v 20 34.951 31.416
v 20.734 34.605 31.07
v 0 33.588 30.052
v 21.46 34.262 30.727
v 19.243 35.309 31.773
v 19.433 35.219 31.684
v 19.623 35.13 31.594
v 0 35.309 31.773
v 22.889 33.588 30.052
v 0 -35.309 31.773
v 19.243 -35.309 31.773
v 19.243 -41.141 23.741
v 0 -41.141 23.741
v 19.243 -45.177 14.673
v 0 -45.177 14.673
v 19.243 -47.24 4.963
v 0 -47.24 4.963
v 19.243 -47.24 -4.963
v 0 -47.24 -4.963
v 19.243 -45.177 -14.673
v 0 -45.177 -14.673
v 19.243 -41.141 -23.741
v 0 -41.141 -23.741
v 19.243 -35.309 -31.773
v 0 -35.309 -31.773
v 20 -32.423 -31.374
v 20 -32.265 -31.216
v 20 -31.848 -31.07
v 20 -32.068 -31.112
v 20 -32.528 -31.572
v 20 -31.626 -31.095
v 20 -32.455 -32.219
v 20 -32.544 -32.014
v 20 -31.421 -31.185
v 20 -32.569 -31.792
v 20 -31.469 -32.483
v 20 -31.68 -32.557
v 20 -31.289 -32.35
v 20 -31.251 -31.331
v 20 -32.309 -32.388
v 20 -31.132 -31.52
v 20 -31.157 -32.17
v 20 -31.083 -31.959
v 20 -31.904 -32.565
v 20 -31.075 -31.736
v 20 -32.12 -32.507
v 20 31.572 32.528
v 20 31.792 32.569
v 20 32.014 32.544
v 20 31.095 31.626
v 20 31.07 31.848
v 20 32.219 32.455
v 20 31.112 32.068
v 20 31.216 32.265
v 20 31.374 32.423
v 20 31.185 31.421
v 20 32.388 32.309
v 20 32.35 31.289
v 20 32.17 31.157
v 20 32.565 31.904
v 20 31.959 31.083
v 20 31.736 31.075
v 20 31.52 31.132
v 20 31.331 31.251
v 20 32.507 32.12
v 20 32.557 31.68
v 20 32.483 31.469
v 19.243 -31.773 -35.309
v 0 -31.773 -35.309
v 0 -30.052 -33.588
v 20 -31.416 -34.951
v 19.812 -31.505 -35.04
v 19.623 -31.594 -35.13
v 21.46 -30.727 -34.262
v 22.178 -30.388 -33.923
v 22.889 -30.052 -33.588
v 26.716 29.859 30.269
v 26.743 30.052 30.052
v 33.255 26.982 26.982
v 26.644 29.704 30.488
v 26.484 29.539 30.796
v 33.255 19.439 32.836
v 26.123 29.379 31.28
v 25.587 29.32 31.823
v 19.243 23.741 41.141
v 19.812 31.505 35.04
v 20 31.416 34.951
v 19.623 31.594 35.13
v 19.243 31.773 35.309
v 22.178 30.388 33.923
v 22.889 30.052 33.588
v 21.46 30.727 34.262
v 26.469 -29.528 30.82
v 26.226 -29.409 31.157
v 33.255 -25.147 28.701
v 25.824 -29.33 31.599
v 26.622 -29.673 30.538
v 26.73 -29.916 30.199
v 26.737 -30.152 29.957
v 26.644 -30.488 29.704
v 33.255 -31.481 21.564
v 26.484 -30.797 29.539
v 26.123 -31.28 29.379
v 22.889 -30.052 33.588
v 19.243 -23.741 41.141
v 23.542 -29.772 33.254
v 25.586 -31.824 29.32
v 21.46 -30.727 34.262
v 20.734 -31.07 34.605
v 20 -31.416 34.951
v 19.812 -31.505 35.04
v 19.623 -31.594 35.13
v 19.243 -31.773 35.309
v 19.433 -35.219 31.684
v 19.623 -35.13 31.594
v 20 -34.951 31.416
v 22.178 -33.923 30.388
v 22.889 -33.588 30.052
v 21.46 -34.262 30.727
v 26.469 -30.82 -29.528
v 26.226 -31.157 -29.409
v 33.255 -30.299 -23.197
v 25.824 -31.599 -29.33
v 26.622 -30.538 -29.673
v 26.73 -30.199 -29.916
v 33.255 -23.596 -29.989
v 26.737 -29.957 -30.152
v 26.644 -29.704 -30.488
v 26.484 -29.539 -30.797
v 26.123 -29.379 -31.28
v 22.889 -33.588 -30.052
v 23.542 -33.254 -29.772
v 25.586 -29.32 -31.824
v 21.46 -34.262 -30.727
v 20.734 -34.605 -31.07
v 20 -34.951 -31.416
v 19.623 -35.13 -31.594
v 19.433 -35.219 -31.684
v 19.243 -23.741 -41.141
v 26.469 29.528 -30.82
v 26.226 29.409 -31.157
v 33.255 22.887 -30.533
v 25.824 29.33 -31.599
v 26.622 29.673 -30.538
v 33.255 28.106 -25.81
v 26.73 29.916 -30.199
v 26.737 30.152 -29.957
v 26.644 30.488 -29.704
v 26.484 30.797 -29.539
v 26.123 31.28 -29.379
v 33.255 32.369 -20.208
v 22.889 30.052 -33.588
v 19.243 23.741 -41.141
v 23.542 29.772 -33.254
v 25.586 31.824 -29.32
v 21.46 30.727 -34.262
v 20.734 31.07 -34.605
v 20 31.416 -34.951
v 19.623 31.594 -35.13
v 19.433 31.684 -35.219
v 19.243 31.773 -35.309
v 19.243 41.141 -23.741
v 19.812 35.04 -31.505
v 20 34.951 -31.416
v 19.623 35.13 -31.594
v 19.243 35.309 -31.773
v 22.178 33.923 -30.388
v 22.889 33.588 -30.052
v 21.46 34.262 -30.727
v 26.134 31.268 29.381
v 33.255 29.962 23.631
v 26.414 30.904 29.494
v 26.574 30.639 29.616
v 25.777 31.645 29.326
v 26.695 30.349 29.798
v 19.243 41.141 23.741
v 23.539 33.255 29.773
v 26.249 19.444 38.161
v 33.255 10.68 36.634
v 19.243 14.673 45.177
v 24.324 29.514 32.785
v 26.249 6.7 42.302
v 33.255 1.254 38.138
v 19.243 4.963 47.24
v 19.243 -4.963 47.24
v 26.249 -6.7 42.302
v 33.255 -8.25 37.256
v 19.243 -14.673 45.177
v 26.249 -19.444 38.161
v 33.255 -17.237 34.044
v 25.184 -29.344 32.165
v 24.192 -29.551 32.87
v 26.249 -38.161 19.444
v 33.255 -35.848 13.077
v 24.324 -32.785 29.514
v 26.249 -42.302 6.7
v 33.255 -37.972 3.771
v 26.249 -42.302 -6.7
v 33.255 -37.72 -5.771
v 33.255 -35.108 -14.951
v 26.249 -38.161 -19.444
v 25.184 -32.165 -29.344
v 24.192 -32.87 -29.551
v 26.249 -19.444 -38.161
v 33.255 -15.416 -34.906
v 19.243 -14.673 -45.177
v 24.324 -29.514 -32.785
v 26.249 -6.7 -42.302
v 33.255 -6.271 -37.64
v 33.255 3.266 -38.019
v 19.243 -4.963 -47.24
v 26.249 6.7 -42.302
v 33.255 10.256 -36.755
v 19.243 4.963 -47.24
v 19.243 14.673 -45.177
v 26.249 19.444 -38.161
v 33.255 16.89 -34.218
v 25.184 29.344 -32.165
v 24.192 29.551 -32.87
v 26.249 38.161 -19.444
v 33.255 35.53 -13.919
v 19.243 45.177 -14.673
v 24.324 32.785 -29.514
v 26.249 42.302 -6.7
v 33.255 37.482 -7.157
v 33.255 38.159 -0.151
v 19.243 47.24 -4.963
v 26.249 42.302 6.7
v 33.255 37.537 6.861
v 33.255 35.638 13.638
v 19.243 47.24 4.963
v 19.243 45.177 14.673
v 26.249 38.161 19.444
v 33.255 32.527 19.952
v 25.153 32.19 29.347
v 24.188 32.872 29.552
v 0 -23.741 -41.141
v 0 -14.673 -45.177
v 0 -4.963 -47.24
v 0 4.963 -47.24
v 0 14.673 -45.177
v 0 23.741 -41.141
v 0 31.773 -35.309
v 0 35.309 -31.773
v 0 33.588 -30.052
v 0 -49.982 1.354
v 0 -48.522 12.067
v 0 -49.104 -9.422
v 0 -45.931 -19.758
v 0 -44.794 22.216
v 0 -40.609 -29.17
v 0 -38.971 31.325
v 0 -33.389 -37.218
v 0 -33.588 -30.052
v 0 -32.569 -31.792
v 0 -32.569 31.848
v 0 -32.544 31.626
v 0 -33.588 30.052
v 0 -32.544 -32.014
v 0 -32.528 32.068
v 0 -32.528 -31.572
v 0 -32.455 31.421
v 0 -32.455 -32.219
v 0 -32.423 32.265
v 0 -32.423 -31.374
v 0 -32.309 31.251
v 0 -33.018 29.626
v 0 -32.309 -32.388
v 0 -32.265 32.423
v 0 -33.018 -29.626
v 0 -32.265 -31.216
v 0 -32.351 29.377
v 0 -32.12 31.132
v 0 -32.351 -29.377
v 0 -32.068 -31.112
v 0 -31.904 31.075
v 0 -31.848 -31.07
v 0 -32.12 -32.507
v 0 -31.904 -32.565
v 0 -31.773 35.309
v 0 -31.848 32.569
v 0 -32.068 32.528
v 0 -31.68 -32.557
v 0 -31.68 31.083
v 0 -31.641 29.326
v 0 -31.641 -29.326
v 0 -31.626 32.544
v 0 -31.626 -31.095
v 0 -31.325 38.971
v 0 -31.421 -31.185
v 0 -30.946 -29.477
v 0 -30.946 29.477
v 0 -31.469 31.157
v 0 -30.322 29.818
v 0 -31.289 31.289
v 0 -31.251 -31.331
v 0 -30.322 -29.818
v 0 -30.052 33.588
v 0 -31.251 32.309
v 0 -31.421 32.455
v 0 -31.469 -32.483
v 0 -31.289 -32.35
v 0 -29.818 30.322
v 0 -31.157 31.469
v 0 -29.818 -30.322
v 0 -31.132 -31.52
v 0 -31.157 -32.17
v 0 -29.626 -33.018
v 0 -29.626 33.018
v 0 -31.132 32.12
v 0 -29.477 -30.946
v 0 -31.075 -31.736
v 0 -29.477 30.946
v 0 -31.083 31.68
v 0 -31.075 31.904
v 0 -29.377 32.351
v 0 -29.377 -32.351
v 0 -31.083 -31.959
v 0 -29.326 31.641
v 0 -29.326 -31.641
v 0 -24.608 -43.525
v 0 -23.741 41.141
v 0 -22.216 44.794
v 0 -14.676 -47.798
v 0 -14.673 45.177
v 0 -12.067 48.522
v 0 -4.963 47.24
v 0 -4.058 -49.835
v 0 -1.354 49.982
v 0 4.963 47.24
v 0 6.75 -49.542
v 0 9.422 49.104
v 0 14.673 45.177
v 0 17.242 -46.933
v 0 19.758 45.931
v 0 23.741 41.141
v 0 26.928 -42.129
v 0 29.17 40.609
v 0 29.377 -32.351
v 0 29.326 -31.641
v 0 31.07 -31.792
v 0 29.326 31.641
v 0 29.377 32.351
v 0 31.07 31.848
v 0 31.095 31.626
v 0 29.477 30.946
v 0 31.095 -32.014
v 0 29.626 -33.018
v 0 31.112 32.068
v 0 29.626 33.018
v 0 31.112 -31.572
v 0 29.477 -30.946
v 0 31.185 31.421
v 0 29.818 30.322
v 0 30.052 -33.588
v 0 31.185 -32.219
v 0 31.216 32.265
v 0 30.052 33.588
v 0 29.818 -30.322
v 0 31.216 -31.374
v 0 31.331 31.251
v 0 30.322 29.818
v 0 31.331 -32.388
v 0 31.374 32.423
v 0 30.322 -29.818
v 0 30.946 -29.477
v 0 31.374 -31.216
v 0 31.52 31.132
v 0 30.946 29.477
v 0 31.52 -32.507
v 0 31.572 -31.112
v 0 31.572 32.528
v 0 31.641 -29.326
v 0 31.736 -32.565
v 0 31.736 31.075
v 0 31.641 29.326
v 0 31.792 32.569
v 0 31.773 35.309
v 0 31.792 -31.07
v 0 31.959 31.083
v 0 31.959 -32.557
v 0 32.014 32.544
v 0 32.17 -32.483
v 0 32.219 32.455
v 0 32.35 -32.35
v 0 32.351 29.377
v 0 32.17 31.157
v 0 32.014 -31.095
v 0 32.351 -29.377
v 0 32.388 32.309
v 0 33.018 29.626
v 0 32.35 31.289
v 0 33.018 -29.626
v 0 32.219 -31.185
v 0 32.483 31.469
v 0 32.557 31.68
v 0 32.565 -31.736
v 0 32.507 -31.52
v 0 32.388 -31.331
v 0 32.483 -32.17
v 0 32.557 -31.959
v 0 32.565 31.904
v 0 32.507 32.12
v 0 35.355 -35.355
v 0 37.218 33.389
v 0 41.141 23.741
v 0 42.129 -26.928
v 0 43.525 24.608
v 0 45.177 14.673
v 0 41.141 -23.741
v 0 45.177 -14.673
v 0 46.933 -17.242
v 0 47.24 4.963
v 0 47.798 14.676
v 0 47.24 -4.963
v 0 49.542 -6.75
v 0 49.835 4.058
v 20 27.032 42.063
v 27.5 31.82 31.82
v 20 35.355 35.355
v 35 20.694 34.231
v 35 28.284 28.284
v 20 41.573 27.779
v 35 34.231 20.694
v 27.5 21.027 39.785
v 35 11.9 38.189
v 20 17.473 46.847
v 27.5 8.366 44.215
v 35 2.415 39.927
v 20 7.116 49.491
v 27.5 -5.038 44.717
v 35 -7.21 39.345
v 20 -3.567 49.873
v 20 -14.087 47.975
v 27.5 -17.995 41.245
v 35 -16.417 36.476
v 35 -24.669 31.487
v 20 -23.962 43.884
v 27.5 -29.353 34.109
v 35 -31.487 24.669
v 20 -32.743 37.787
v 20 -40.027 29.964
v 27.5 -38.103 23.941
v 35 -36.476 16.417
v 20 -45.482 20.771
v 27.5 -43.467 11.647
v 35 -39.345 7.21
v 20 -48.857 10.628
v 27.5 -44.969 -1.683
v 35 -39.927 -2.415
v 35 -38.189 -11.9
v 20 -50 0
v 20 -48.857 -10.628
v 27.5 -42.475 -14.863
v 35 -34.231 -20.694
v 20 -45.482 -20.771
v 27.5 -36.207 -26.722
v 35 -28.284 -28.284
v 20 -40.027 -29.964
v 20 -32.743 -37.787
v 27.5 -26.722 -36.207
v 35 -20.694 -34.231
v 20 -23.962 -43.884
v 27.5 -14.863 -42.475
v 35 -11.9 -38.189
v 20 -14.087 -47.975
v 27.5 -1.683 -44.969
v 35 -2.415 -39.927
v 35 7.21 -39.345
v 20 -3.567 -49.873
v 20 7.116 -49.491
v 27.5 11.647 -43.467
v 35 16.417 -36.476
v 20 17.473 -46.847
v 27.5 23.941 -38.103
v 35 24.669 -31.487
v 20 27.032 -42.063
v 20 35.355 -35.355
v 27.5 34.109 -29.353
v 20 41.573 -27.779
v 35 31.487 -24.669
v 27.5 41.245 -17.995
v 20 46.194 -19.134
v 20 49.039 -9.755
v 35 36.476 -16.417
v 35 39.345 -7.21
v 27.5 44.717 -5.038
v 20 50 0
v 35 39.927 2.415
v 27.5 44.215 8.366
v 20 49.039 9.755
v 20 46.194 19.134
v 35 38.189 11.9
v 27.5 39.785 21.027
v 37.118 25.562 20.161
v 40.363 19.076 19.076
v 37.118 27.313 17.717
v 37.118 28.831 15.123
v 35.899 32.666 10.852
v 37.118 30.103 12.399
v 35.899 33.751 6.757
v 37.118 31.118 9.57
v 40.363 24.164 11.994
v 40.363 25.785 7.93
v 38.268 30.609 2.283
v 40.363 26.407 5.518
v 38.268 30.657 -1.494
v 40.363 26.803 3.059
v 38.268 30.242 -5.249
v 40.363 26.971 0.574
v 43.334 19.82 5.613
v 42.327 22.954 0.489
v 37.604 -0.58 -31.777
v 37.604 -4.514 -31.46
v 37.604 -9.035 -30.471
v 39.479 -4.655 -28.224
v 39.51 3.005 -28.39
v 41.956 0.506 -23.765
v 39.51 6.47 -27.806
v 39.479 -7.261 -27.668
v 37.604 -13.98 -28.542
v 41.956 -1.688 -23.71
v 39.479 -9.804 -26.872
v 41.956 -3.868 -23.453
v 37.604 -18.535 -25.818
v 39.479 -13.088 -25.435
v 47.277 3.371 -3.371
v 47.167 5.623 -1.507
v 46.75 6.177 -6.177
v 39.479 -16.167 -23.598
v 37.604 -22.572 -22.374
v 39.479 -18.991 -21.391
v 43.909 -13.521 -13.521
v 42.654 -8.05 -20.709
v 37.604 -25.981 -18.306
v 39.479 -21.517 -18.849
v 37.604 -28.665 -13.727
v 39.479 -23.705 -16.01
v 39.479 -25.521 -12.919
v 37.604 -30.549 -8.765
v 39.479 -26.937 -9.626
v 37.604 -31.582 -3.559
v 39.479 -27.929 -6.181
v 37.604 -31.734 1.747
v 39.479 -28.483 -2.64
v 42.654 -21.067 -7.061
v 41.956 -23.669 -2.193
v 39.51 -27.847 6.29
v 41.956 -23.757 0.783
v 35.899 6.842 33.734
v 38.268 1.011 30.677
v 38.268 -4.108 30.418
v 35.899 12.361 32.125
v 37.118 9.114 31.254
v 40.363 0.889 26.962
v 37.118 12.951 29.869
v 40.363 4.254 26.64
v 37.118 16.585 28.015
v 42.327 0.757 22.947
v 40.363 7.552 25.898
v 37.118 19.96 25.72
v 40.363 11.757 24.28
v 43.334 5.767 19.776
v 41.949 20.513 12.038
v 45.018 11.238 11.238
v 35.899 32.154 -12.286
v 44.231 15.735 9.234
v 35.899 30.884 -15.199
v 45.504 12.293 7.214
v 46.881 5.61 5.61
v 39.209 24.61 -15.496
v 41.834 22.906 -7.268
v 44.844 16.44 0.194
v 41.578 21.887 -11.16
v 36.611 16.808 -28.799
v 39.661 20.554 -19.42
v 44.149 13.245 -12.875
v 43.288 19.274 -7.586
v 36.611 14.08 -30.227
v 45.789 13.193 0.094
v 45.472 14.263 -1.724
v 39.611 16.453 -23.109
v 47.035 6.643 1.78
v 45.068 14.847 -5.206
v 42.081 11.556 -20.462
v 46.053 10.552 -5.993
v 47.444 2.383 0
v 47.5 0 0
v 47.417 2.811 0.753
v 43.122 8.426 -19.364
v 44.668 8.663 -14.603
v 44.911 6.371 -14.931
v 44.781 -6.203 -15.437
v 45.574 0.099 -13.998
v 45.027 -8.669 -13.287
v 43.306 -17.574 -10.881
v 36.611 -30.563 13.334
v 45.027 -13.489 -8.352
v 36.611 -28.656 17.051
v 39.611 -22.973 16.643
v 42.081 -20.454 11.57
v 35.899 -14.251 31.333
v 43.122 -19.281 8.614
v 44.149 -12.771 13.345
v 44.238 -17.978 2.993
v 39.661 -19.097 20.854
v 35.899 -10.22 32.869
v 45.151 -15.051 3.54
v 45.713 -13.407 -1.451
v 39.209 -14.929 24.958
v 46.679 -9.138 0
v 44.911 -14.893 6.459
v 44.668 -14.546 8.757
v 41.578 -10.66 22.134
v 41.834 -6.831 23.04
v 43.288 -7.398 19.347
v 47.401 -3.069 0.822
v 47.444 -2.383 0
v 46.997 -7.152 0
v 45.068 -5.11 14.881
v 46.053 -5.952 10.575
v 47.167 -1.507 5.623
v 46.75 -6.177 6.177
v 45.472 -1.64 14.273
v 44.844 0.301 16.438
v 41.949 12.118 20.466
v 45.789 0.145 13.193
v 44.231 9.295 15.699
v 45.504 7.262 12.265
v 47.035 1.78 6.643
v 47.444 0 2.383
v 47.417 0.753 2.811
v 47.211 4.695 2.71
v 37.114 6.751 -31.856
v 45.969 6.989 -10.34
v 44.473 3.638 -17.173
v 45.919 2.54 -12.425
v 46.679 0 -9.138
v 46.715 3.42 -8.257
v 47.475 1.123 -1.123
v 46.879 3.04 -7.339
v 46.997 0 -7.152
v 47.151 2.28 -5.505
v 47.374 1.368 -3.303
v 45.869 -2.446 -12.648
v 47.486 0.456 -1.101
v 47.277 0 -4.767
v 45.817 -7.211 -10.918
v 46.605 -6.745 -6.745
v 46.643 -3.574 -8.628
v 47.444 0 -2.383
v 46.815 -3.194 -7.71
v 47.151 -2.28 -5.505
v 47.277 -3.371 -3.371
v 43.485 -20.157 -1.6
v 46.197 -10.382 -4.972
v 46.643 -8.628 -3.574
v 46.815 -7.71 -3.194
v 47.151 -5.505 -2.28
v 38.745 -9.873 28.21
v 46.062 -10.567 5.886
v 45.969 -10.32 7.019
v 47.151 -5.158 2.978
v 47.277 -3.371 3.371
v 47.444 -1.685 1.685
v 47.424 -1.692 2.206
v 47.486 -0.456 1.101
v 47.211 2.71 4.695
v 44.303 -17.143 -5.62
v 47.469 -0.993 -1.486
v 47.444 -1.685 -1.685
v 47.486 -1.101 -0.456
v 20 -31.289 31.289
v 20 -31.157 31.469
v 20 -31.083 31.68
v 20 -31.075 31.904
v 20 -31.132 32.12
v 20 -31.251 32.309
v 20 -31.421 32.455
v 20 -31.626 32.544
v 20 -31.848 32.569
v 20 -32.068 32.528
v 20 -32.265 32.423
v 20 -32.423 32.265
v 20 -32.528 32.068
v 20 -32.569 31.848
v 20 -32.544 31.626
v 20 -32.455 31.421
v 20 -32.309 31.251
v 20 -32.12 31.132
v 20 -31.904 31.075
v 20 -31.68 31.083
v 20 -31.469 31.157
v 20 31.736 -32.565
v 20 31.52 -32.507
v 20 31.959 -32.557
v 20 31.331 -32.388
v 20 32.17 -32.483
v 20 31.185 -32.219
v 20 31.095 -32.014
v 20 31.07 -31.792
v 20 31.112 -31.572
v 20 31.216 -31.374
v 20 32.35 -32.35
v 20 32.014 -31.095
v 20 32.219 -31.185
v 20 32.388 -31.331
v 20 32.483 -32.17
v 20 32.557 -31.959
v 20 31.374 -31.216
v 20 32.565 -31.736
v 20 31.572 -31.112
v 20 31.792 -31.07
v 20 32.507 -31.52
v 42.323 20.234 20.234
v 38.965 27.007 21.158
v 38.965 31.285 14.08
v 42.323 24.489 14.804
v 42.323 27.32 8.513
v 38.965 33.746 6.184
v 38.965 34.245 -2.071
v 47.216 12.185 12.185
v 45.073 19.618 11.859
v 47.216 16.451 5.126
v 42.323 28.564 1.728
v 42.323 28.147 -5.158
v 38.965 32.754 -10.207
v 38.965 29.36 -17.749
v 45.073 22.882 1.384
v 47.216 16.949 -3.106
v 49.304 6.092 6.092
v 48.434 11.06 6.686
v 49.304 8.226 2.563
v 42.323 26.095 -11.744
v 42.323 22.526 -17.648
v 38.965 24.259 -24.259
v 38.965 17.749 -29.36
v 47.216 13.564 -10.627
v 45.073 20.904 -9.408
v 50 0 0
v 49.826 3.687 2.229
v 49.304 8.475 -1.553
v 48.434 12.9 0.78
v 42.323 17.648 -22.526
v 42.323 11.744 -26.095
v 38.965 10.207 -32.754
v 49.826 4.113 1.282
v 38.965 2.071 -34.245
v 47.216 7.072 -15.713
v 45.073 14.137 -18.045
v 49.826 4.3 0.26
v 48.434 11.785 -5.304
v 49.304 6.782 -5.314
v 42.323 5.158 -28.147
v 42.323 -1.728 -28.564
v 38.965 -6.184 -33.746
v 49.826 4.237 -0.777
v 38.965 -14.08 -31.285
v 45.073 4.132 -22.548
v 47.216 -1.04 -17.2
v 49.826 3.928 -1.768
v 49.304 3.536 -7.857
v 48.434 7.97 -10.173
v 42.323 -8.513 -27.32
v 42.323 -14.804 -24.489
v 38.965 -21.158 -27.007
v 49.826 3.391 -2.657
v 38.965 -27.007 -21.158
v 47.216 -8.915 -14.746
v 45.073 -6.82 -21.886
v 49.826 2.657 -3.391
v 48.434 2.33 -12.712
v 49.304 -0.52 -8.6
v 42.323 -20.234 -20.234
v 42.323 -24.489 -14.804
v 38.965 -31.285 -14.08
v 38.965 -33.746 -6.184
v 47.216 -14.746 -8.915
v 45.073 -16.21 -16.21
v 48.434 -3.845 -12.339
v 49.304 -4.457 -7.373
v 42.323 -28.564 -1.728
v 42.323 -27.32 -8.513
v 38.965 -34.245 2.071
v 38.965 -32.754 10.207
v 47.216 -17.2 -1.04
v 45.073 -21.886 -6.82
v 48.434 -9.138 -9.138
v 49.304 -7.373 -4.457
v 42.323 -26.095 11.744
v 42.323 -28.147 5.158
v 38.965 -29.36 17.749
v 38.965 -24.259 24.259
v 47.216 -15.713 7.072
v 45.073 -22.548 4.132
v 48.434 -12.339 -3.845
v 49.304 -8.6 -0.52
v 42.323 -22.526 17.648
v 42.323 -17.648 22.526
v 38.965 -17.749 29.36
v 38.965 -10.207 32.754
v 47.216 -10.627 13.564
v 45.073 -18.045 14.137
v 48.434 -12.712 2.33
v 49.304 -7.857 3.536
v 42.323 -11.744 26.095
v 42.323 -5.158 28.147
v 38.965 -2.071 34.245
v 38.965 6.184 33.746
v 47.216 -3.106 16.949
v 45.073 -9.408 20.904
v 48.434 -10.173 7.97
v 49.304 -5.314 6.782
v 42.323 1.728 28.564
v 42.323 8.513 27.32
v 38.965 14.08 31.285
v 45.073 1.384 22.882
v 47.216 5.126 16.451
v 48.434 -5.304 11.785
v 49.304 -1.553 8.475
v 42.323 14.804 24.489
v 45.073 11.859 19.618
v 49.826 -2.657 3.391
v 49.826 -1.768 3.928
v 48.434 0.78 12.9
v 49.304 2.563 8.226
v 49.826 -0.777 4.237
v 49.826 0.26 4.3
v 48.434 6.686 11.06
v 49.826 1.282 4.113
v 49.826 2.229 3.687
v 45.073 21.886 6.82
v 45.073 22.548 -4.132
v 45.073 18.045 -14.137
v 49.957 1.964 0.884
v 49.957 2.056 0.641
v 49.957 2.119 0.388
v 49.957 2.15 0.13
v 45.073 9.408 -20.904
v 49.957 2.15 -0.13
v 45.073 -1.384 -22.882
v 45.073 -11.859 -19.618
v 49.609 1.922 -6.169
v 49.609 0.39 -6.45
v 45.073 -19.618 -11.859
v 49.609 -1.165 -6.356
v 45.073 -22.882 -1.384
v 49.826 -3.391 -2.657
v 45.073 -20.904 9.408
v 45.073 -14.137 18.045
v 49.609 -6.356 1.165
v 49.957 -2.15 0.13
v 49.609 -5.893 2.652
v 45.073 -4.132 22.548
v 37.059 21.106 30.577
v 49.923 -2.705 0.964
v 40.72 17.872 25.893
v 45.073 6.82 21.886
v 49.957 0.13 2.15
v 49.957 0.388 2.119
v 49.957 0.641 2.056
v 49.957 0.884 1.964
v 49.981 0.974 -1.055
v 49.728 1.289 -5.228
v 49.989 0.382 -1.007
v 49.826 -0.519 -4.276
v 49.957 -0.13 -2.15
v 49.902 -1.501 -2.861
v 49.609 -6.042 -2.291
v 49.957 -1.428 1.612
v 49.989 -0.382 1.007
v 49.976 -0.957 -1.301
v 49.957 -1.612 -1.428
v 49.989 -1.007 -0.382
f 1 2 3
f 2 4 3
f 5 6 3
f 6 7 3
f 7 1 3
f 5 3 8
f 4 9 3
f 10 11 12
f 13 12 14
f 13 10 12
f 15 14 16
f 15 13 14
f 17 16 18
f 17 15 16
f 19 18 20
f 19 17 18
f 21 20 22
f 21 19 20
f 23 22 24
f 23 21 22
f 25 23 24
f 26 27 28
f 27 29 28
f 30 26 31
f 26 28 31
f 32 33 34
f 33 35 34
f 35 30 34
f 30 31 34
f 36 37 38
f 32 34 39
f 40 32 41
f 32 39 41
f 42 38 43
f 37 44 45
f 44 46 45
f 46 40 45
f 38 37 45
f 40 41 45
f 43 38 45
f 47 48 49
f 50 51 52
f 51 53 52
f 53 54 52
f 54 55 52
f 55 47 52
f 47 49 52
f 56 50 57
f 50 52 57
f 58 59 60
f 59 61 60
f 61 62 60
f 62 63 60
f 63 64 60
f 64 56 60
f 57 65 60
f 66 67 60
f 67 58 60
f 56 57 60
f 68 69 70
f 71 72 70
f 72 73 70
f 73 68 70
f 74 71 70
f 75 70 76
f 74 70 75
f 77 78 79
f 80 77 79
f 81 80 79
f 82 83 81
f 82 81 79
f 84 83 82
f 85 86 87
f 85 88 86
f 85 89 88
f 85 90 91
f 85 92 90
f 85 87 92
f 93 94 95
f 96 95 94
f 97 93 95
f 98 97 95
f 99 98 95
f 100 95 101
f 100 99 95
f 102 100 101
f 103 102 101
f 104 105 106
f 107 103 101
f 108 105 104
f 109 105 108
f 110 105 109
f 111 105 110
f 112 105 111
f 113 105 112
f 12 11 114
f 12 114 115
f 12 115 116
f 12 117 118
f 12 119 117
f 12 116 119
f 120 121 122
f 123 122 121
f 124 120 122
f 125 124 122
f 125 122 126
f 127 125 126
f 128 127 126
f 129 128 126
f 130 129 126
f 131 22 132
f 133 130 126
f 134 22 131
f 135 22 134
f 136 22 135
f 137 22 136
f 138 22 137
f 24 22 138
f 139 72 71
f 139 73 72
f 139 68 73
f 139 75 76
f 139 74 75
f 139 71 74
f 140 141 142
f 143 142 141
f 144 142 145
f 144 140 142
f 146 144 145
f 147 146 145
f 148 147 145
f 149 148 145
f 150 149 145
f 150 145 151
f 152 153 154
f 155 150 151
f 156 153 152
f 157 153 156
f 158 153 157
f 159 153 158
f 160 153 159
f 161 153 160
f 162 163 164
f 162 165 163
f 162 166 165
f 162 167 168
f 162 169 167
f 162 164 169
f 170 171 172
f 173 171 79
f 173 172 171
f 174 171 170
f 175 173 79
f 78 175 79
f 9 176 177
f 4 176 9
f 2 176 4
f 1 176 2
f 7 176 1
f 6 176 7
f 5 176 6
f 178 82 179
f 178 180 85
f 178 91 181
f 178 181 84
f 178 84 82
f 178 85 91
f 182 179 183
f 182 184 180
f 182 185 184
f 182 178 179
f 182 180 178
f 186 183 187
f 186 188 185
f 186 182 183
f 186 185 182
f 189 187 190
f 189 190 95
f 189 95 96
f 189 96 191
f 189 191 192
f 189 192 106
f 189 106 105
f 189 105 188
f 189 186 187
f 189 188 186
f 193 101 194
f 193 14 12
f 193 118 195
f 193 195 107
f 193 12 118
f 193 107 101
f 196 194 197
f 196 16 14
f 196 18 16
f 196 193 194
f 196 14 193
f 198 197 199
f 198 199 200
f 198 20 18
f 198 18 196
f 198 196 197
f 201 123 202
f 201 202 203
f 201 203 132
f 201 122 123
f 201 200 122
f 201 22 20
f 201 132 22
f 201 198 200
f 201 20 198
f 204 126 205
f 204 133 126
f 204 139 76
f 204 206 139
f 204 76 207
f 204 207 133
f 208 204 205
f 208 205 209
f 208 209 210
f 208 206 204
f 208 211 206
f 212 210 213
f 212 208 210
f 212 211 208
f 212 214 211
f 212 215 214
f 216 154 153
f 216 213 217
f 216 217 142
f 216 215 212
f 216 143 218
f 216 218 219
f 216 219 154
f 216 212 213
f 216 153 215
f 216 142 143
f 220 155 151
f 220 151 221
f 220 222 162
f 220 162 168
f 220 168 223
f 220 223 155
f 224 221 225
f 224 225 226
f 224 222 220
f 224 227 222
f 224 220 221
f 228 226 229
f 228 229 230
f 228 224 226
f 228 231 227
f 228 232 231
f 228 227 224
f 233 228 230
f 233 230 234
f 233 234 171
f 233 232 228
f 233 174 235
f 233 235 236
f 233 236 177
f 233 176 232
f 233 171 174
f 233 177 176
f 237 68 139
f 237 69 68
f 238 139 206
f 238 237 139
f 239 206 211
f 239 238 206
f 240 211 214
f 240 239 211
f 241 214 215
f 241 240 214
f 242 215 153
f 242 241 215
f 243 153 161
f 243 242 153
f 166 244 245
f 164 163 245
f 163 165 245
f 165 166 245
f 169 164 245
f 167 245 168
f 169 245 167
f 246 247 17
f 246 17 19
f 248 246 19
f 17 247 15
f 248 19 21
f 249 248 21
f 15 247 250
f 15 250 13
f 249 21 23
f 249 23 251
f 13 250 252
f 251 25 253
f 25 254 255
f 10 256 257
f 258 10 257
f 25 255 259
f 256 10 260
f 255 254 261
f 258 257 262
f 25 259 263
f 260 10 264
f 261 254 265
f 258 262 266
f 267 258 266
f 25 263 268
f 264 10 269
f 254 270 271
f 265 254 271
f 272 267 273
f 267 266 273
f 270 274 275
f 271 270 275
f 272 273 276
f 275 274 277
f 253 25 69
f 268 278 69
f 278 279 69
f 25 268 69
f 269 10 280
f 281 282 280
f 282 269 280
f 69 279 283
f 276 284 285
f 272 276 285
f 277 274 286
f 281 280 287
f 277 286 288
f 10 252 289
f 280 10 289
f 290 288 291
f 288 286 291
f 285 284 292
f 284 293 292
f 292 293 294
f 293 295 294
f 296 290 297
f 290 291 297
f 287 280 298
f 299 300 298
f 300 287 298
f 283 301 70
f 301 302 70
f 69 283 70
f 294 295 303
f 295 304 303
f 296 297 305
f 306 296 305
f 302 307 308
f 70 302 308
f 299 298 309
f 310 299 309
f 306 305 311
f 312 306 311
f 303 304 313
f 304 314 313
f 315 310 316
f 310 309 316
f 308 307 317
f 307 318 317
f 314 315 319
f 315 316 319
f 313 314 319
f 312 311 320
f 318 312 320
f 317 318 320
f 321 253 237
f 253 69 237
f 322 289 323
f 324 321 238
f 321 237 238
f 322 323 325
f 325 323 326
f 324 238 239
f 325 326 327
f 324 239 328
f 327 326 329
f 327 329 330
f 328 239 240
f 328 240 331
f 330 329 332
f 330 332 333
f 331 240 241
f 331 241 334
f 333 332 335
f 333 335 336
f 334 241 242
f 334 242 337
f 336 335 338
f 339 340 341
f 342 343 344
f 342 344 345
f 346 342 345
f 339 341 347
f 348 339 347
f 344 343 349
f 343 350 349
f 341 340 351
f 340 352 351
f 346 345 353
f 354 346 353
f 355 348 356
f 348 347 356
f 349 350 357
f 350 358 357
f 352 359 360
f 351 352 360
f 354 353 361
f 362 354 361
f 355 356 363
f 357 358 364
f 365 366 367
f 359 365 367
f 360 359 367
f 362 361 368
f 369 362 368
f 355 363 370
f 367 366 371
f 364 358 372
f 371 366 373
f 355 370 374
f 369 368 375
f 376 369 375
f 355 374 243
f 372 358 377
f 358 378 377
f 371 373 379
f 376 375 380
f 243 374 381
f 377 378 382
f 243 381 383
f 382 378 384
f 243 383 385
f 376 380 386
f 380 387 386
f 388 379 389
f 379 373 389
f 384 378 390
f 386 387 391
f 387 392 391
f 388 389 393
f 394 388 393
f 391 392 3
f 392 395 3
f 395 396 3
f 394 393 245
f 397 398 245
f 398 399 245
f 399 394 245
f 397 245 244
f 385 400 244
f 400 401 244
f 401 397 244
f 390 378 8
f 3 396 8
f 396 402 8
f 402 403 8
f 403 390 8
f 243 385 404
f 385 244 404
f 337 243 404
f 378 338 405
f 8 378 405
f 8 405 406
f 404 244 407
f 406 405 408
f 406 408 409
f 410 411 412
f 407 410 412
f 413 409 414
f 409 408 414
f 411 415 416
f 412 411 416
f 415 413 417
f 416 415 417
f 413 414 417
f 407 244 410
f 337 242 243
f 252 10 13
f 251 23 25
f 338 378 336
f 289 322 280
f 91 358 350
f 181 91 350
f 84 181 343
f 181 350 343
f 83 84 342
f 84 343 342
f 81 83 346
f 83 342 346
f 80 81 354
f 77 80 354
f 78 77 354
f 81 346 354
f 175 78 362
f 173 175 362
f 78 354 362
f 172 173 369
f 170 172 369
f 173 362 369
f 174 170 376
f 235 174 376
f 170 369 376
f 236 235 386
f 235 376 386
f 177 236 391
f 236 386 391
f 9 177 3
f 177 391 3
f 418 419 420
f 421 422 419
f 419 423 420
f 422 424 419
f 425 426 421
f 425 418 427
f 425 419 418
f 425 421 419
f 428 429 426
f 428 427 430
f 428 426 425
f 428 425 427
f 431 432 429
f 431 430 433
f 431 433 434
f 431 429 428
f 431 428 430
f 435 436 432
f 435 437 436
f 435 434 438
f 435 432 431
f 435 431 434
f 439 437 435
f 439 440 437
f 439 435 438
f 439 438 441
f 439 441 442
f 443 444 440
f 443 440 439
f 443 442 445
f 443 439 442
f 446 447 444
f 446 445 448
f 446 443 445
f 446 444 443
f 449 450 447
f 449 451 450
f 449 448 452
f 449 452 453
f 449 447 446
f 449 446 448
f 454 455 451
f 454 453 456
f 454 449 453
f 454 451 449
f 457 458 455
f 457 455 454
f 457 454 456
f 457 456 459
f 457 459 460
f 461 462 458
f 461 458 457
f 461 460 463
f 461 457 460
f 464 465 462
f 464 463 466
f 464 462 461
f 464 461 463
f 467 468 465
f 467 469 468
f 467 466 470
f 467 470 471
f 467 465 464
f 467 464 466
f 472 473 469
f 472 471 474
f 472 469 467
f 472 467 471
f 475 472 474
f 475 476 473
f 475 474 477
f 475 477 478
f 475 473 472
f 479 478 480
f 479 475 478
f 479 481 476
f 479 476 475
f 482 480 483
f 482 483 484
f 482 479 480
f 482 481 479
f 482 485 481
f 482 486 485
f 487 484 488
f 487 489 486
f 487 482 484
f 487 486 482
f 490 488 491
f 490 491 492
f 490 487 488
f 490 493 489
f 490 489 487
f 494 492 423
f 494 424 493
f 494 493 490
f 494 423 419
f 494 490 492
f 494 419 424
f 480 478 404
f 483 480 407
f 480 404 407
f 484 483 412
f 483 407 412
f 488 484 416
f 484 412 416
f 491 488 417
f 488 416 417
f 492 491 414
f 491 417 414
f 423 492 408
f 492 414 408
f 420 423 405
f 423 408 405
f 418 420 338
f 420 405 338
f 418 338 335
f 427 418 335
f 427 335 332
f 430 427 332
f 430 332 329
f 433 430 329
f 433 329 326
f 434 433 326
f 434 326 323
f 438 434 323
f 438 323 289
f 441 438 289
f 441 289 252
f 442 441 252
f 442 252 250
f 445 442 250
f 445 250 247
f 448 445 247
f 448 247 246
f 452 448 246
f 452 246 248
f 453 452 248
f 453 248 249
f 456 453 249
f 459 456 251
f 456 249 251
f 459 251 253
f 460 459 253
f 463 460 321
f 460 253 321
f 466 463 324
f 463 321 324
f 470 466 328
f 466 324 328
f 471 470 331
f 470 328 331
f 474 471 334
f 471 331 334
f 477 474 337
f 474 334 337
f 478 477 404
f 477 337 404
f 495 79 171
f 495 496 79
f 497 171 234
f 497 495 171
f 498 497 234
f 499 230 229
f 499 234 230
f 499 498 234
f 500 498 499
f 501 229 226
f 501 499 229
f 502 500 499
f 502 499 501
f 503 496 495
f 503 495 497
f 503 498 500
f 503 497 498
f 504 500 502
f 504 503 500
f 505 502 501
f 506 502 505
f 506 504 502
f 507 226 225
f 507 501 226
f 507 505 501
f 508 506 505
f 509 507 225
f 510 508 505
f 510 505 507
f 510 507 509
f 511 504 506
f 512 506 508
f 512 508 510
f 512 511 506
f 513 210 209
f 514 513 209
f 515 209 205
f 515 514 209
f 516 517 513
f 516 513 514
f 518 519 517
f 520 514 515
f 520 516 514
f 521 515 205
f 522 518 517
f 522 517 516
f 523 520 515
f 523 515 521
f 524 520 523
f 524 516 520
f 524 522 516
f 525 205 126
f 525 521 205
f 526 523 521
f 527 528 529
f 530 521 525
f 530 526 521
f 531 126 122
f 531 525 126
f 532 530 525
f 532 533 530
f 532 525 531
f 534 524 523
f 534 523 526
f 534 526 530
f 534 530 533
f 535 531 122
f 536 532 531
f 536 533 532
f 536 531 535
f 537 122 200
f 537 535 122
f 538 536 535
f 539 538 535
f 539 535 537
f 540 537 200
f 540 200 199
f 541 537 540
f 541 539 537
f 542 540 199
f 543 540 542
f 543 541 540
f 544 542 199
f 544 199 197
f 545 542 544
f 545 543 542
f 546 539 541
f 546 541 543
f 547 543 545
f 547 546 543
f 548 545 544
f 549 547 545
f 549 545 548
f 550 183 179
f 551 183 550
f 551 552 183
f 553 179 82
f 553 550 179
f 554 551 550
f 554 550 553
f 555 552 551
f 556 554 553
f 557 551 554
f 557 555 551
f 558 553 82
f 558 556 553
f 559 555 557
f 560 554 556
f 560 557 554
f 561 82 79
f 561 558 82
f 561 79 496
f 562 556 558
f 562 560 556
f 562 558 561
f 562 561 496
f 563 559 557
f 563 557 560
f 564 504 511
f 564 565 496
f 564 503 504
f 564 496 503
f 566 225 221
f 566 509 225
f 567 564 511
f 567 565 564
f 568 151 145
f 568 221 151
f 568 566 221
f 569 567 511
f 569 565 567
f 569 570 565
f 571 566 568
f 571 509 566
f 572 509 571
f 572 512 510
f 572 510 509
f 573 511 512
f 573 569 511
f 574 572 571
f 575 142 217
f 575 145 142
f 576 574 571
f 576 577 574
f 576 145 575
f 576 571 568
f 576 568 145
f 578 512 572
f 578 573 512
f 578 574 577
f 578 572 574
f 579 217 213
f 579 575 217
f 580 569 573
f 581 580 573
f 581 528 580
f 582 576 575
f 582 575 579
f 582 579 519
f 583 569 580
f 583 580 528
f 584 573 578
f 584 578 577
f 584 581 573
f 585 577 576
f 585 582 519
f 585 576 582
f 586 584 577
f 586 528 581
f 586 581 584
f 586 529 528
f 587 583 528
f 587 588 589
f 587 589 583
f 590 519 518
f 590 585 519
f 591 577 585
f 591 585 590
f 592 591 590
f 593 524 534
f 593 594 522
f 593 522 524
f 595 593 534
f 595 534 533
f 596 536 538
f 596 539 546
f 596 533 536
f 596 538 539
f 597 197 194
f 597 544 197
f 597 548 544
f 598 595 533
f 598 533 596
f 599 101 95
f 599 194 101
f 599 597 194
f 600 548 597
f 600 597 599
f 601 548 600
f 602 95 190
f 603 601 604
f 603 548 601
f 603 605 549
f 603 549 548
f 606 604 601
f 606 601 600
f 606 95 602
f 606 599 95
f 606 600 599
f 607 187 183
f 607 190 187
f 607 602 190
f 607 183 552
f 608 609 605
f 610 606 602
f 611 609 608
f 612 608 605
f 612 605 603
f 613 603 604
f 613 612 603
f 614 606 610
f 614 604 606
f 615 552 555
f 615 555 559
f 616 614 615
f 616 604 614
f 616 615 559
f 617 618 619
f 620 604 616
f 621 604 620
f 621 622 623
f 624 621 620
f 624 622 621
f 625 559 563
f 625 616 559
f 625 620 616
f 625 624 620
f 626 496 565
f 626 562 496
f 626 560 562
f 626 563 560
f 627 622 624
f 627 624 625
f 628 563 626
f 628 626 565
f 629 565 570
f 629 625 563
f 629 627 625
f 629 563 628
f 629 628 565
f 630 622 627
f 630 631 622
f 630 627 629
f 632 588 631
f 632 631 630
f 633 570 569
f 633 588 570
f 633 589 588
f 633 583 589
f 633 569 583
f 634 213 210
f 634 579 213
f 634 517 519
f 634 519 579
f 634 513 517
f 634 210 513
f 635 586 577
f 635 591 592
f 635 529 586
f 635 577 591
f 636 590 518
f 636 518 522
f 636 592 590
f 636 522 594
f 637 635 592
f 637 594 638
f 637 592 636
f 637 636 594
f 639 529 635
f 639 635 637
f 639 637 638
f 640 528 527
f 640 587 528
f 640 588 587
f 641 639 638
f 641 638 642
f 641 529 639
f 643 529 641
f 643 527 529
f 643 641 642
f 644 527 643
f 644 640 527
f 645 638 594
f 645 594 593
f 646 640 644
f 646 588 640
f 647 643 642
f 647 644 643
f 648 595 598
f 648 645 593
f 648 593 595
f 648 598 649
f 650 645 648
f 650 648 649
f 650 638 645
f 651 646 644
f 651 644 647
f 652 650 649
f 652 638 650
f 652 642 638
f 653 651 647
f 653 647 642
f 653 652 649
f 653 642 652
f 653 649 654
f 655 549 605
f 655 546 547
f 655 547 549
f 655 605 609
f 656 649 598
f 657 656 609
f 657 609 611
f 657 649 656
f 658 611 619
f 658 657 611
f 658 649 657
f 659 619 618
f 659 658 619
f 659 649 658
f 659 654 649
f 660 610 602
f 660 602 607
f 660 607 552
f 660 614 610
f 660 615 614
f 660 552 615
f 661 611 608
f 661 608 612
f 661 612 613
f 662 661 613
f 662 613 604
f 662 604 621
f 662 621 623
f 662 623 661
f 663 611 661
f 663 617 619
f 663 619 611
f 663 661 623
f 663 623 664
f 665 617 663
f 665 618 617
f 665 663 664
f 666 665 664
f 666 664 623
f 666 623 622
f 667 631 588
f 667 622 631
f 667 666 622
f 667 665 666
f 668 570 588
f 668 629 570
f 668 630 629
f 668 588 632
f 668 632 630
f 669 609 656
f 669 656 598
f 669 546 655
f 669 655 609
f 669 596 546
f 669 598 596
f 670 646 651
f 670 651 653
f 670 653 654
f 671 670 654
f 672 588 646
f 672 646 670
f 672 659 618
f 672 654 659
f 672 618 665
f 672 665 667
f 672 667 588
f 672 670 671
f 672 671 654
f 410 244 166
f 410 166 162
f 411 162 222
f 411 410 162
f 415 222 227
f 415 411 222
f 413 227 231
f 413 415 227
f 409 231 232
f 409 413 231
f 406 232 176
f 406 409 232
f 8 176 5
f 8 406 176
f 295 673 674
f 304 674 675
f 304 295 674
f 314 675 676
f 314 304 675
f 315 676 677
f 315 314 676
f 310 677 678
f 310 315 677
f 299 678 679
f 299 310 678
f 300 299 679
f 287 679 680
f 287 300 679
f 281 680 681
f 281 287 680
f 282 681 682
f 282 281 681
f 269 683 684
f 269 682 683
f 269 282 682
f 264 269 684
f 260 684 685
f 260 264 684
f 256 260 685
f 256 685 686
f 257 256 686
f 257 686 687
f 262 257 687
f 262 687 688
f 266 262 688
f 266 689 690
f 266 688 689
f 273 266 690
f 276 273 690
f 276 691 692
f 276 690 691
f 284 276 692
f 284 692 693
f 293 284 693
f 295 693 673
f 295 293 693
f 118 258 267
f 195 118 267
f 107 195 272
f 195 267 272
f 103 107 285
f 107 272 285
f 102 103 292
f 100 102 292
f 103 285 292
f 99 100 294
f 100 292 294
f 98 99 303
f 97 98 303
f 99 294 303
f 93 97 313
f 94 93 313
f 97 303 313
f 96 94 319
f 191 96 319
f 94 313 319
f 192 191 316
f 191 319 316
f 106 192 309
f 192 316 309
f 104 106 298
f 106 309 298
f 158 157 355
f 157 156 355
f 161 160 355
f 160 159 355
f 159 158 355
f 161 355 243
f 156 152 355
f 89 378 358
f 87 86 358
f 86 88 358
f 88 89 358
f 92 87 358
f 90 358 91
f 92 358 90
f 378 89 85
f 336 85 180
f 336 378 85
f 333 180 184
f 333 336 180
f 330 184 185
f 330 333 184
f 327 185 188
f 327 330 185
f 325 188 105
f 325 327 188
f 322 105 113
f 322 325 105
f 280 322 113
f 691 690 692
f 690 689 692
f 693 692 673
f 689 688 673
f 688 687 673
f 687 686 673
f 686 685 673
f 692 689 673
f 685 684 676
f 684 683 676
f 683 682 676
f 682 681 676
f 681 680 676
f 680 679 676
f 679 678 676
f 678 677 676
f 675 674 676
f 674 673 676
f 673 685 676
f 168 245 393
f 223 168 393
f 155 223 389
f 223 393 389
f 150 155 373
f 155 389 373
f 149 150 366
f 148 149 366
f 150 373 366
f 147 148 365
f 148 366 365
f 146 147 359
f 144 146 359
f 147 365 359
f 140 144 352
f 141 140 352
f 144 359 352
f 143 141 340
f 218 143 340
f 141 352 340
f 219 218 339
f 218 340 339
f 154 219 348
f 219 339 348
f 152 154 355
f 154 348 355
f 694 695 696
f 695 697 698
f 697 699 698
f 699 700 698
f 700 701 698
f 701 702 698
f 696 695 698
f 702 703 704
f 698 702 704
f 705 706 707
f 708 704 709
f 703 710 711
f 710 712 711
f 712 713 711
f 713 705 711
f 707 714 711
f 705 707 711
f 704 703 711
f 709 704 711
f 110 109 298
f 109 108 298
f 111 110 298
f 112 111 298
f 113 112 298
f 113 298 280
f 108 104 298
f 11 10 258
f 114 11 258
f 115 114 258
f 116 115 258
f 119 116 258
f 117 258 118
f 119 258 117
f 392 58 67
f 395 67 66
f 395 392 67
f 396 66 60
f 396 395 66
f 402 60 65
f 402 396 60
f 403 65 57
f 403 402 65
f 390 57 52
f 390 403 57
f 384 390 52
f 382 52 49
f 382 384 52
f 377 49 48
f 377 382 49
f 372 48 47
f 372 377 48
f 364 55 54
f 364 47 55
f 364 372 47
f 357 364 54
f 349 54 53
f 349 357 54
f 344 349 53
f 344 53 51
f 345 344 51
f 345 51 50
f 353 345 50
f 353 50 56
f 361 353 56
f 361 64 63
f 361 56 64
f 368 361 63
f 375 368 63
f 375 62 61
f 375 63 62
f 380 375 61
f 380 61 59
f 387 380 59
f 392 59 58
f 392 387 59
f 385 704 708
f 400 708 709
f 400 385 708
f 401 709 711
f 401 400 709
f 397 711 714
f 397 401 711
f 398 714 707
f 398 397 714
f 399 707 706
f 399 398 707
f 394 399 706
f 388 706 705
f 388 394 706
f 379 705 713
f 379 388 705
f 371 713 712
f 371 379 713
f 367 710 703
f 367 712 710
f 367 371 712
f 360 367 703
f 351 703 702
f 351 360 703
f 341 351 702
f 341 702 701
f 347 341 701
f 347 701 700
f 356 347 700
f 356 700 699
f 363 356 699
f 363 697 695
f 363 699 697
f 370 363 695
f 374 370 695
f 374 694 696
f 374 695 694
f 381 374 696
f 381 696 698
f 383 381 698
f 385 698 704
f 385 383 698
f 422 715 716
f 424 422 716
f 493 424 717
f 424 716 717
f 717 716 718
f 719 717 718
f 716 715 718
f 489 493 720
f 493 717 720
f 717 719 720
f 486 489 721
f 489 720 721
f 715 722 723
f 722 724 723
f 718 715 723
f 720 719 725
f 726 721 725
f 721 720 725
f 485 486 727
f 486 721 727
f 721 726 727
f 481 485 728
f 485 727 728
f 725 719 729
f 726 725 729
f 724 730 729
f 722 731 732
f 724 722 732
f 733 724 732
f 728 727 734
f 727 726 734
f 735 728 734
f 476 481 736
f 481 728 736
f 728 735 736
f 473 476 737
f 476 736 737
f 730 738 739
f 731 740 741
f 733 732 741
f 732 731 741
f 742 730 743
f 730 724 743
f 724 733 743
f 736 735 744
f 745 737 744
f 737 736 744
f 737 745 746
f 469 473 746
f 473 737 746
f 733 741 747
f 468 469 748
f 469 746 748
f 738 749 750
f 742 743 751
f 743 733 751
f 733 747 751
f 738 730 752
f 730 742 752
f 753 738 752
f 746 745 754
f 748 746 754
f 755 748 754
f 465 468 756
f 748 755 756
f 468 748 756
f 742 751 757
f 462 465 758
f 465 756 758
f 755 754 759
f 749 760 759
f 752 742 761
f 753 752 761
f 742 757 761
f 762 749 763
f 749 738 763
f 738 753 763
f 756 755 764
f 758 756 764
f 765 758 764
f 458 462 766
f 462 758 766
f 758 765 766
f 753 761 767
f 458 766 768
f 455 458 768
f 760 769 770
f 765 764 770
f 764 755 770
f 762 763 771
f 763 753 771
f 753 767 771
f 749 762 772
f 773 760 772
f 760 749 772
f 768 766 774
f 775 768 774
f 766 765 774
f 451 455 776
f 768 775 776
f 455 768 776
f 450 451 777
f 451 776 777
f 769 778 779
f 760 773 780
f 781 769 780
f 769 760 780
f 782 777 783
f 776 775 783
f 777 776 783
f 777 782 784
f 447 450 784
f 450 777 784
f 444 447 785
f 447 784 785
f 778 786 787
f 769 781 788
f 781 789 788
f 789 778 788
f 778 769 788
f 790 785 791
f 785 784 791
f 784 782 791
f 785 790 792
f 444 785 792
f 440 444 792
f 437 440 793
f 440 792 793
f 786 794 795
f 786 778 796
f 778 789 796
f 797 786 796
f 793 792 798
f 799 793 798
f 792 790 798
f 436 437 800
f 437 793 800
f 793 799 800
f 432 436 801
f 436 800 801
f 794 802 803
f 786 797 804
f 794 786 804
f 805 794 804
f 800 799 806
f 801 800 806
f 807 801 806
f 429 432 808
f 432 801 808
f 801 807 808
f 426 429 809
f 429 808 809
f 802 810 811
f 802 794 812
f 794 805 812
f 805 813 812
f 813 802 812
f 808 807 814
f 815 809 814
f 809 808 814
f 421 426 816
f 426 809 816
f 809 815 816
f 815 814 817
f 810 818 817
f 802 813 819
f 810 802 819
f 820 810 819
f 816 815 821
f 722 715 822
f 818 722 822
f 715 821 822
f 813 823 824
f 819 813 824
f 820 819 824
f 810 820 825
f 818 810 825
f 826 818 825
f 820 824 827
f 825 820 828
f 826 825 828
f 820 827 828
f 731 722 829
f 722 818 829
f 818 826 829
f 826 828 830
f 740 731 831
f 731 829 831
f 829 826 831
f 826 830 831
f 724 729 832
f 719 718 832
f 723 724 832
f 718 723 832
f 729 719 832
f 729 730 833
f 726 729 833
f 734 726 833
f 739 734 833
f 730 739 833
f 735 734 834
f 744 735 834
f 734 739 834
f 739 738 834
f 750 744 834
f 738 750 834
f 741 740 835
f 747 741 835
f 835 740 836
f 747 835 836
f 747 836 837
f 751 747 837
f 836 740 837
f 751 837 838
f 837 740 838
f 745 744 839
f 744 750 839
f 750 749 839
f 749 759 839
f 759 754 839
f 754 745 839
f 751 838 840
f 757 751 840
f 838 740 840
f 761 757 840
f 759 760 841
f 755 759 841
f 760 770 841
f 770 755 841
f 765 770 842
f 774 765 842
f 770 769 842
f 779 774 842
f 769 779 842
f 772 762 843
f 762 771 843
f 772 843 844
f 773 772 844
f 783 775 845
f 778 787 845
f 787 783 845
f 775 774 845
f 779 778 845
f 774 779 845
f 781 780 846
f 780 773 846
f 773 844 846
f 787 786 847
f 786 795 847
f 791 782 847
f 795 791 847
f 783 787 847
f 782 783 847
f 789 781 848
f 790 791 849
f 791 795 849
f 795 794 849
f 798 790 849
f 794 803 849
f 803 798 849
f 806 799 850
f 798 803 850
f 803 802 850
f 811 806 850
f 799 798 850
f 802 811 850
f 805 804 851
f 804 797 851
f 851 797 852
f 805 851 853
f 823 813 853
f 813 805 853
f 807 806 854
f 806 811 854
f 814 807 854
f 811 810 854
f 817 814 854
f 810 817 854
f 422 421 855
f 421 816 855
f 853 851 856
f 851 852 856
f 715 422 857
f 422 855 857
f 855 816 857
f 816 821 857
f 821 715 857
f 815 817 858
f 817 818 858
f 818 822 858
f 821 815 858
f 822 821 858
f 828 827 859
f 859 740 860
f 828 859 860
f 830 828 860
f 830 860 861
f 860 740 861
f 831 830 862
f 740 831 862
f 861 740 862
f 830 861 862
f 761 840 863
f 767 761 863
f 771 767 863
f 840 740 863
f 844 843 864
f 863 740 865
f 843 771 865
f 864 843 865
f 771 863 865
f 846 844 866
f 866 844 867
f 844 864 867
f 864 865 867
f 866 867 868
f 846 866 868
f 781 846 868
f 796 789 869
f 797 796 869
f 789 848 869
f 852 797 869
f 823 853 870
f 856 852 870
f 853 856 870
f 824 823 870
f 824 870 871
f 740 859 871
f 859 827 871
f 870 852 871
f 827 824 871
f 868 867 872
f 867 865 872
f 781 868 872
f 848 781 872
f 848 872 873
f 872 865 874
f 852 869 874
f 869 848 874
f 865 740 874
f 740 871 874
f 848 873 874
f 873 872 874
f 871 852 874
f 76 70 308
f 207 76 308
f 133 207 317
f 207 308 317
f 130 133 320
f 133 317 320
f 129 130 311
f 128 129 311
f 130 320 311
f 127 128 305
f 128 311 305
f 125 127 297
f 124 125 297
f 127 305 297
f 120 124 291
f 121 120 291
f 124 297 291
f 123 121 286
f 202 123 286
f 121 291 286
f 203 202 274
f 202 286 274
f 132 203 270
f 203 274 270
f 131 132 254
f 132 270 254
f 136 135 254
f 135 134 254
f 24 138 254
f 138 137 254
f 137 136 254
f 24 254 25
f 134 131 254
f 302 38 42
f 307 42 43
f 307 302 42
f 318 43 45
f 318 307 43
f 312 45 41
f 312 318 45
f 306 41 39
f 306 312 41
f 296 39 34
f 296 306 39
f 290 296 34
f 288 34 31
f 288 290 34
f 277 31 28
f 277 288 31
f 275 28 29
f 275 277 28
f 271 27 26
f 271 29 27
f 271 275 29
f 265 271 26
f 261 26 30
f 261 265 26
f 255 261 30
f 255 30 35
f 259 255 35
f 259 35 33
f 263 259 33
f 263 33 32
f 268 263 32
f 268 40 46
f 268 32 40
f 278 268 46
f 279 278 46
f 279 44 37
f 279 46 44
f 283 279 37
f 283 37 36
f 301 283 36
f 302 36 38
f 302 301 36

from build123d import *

# Parameters (mm, degrees)
SURFACE_EXTRUDE3_1_DEPTH = 20
THICKEN6_T1              = 2.5
BOSS_EXTRUDE2_DEPTH      = 20
SKETCH6_R                = 0.75
CUT_EXTRUDE1_DEPTH       = 74.484692283
BOSS_EXTRUDE4_REACH      = 75.485
THICKEN8_T1              = 2.5
BODY_MOVE_COPY1_ANGLE    = 45


# Read off the part's stored shape, not the designer's step: Thicken7
with BuildPart() as body_1:
    # Surface-Extrude3: a surface, the sketch's curves swept straight by 20 mm
    with BuildLine(Plane(origin=(0, 0, 0), x_dir=(0, 0, -1), z_dir=(1, 0, 0)), mode=Mode.PRIVATE) as surface_extrude3_1_path:
        CenterArc((0, 0), 50, 0, 360)
    surface_extrude3_1 = Shell.extrude(surface_extrude3_1_path.wire(), (1 * SURFACE_EXTRUDE3_1_DEPTH, 0 * SURFACE_EXTRUDE3_1_DEPTH, 0 * SURFACE_EXTRUDE3_1_DEPTH))
    add(Solid.thicken(surface_extrude3_1, THICKEN6_T1))

    # Sketch5 → Boss-Extrude2 (add)
    with BuildSketch(Plane(origin=(0, 0, 0), x_dir=(0, 0, -1), z_dir=(1, 0, 0))):
        with BuildLine():
            Line((2.5, 45), (2.5, 47.5))
            Line((2.5, 47.5), (-2.5, 47.5))
            Line((-2.5, 47.5), (-2.5, 45))
            ThreePointArc((-2.5, 45), (0, 42.5), (2.5, 45))
        make_face()
        with BuildLine():
            Line((-45, -2.5), (-47.5, -2.5))
            Line((-47.5, -2.5), (-47.5, 2.5))
            Line((-47.5, 2.5), (-45, 2.5))
            ThreePointArc((-45, 2.5), (-42.5, 0), (-45, -2.5))
        make_face()
        with BuildLine():
            Line((47.5, 2.5), (45, 2.5))
            ThreePointArc((45, 2.5), (42.5, 0), (45, -2.5))
            Line((45, -2.5), (47.5, -2.5))
            Line((47.5, -2.5), (47.5, 2.5))
        make_face()
        with BuildLine():
            Line((-2.5, -47.5), (2.5, -47.5))
            Line((2.5, -47.5), (2.5, -45))
            ThreePointArc((2.5, -45), (0, -42.5), (-2.5, -45))
            Line((-2.5, -45), (-2.5, -47.5))
        make_face()
    extrude(amount=BOSS_EXTRUDE2_DEPTH)

    # Sketch6 → Cut-Extrude1 (cut, through all)
    with BuildSketch(Plane(origin=(0, 0, 0), x_dir=(0, 0, -1), z_dir=(1, 0, 0))):
        with Locations((0, 45)):
            Circle(SKETCH6_R)
        with Locations((45, 0)):
            Circle(SKETCH6_R)
        with Locations((0, -45)):
            Circle(SKETCH6_R)
        with Locations((-45, 0)):
            Circle(SKETCH6_R)
    extrude(amount=CUT_EXTRUDE1_DEPTH, mode=Mode.SUBTRACT)

    # Thicken7 outline → Thicken7 (revolve)
    with BuildSketch(Plane.YX):
        Polygon((40, 35), (37.919874264, 33.613249509), (47.5, 19.243060906), (47.5, 20), (50, 20), align=None)
    revolve(axis=Axis((0, 0, 0), (1, 0, 0)))

    # Sketch10 → Boss-Extrude4 (add, up to next)
    with BuildSketch(Plane(origin=(20, 0, 0), x_dir=(0, 0, -1), z_dir=(1, 0, 0)), mode=Mode.PRIVATE) as boss_extrude4_sk1:
        with BuildLine():
            Line((-45, 2.5), (-46.92883092, 2.5))
            ThreePointArc((-46.92883092, 2.5), (-46.995373937, 0), (-46.92883092, -2.5))
            Line((-46.92883092, -2.5), (-45, -2.5))
            ThreePointArc((-45, -2.5), (-42.5, 0), (-45, 2.5))
        make_face()
    boss_extrude4_tool1 = extrude(boss_extrude4_sk1.sketch, amount=BOSS_EXTRUDE4_REACH, mode=Mode.PRIVATE) - body_1.part
    # Sketch10 → Boss-Extrude4 (add, up to next)
    with BuildSketch(Plane(origin=(20, 0, 0), x_dir=(0, 0, -1), z_dir=(1, 0, 0)), mode=Mode.PRIVATE) as boss_extrude4_sk2:
        with BuildLine():
            Line((-2.5, -45), (-2.5, -46.92883092))
            ThreePointArc((-2.5, -46.92883092), (0, -46.995373937), (2.5, -46.92883092))
            Line((2.5, -46.92883092), (2.5, -45))
            ThreePointArc((2.5, -45), (0, -42.5), (-2.5, -45))
        make_face()
    boss_extrude4_tool2 = extrude(boss_extrude4_sk2.sketch, amount=BOSS_EXTRUDE4_REACH, mode=Mode.PRIVATE) - body_1.part
    # Sketch10 → Boss-Extrude4 (add, up to next)
    with BuildSketch(Plane(origin=(20, 0, 0), x_dir=(0, 0, -1), z_dir=(1, 0, 0)), mode=Mode.PRIVATE) as boss_extrude4_sk3:
        with BuildLine():
            Line((45, -2.5), (46.92883092, -2.5))
            ThreePointArc((46.92883092, -2.5), (46.995373937, 0), (46.92883092, 2.5))
            Line((46.92883092, 2.5), (45, 2.5))
            ThreePointArc((45, 2.5), (42.5, 0), (45, -2.5))
        make_face()
    boss_extrude4_tool3 = extrude(boss_extrude4_sk3.sketch, amount=BOSS_EXTRUDE4_REACH, mode=Mode.PRIVATE) - body_1.part
    # Sketch10 → Boss-Extrude4 (add, up to next)
    with BuildSketch(Plane(origin=(20, 0, 0), x_dir=(0, 0, -1), z_dir=(1, 0, 0)), mode=Mode.PRIVATE) as boss_extrude4_sk4:
        with BuildLine():
            Line((2.5, 45), (2.5, 46.92883092))
            ThreePointArc((2.5, 46.92883092), (0, 46.995373937), (-2.5, 46.92883092))
            Line((-2.5, 46.92883092), (-2.5, 45))
            ThreePointArc((-2.5, 45), (0, 42.5), (2.5, 45))
        make_face()
    boss_extrude4_tool4 = extrude(boss_extrude4_sk4.sketch, amount=BOSS_EXTRUDE4_REACH, mode=Mode.PRIVATE) - body_1.part
    add(boss_extrude4_tool1.solids().sort_by_distance((20, 0, 44.965357))[0])
    add(boss_extrude4_tool2.solids().sort_by_distance((20, -44.965357, 0))[0])
    add(boss_extrude4_tool3.solids().sort_by_distance((20, 0, -44.965357))[0])
    add(boss_extrude4_tool4.solids().sort_by_distance((20, 44.965357, 0))[0])

    # Surface-Revolve3: a surface, the sketch's curves turned about an axis
    with BuildLine(Plane.XY, mode=Mode.PRIVATE) as surface_revolve3_2_path:
        add(Edge.make_bspline(
            [(35, 40), (50, 20), (50, 0)],
            knots=[0, 0, 0, 0.5, 0.5, 0.5], degree=2))
    surface_revolve3_2 = Shell.revolve(surface_revolve3_2_path.wire(), 360, Axis((50, 0, 0), (-1, 0, 0)))
    add(Solid.thicken(surface_revolve3_2, THICKEN8_T1))


with BuildPart() as body_1_1:
    # Body-Move/Copy1: moved
    add(body_1.part.rotate(Axis((0, 0, 0), (1, 0, 0)), BODY_MOVE_COPY1_ANGLE))


solid = body_1_1.part
